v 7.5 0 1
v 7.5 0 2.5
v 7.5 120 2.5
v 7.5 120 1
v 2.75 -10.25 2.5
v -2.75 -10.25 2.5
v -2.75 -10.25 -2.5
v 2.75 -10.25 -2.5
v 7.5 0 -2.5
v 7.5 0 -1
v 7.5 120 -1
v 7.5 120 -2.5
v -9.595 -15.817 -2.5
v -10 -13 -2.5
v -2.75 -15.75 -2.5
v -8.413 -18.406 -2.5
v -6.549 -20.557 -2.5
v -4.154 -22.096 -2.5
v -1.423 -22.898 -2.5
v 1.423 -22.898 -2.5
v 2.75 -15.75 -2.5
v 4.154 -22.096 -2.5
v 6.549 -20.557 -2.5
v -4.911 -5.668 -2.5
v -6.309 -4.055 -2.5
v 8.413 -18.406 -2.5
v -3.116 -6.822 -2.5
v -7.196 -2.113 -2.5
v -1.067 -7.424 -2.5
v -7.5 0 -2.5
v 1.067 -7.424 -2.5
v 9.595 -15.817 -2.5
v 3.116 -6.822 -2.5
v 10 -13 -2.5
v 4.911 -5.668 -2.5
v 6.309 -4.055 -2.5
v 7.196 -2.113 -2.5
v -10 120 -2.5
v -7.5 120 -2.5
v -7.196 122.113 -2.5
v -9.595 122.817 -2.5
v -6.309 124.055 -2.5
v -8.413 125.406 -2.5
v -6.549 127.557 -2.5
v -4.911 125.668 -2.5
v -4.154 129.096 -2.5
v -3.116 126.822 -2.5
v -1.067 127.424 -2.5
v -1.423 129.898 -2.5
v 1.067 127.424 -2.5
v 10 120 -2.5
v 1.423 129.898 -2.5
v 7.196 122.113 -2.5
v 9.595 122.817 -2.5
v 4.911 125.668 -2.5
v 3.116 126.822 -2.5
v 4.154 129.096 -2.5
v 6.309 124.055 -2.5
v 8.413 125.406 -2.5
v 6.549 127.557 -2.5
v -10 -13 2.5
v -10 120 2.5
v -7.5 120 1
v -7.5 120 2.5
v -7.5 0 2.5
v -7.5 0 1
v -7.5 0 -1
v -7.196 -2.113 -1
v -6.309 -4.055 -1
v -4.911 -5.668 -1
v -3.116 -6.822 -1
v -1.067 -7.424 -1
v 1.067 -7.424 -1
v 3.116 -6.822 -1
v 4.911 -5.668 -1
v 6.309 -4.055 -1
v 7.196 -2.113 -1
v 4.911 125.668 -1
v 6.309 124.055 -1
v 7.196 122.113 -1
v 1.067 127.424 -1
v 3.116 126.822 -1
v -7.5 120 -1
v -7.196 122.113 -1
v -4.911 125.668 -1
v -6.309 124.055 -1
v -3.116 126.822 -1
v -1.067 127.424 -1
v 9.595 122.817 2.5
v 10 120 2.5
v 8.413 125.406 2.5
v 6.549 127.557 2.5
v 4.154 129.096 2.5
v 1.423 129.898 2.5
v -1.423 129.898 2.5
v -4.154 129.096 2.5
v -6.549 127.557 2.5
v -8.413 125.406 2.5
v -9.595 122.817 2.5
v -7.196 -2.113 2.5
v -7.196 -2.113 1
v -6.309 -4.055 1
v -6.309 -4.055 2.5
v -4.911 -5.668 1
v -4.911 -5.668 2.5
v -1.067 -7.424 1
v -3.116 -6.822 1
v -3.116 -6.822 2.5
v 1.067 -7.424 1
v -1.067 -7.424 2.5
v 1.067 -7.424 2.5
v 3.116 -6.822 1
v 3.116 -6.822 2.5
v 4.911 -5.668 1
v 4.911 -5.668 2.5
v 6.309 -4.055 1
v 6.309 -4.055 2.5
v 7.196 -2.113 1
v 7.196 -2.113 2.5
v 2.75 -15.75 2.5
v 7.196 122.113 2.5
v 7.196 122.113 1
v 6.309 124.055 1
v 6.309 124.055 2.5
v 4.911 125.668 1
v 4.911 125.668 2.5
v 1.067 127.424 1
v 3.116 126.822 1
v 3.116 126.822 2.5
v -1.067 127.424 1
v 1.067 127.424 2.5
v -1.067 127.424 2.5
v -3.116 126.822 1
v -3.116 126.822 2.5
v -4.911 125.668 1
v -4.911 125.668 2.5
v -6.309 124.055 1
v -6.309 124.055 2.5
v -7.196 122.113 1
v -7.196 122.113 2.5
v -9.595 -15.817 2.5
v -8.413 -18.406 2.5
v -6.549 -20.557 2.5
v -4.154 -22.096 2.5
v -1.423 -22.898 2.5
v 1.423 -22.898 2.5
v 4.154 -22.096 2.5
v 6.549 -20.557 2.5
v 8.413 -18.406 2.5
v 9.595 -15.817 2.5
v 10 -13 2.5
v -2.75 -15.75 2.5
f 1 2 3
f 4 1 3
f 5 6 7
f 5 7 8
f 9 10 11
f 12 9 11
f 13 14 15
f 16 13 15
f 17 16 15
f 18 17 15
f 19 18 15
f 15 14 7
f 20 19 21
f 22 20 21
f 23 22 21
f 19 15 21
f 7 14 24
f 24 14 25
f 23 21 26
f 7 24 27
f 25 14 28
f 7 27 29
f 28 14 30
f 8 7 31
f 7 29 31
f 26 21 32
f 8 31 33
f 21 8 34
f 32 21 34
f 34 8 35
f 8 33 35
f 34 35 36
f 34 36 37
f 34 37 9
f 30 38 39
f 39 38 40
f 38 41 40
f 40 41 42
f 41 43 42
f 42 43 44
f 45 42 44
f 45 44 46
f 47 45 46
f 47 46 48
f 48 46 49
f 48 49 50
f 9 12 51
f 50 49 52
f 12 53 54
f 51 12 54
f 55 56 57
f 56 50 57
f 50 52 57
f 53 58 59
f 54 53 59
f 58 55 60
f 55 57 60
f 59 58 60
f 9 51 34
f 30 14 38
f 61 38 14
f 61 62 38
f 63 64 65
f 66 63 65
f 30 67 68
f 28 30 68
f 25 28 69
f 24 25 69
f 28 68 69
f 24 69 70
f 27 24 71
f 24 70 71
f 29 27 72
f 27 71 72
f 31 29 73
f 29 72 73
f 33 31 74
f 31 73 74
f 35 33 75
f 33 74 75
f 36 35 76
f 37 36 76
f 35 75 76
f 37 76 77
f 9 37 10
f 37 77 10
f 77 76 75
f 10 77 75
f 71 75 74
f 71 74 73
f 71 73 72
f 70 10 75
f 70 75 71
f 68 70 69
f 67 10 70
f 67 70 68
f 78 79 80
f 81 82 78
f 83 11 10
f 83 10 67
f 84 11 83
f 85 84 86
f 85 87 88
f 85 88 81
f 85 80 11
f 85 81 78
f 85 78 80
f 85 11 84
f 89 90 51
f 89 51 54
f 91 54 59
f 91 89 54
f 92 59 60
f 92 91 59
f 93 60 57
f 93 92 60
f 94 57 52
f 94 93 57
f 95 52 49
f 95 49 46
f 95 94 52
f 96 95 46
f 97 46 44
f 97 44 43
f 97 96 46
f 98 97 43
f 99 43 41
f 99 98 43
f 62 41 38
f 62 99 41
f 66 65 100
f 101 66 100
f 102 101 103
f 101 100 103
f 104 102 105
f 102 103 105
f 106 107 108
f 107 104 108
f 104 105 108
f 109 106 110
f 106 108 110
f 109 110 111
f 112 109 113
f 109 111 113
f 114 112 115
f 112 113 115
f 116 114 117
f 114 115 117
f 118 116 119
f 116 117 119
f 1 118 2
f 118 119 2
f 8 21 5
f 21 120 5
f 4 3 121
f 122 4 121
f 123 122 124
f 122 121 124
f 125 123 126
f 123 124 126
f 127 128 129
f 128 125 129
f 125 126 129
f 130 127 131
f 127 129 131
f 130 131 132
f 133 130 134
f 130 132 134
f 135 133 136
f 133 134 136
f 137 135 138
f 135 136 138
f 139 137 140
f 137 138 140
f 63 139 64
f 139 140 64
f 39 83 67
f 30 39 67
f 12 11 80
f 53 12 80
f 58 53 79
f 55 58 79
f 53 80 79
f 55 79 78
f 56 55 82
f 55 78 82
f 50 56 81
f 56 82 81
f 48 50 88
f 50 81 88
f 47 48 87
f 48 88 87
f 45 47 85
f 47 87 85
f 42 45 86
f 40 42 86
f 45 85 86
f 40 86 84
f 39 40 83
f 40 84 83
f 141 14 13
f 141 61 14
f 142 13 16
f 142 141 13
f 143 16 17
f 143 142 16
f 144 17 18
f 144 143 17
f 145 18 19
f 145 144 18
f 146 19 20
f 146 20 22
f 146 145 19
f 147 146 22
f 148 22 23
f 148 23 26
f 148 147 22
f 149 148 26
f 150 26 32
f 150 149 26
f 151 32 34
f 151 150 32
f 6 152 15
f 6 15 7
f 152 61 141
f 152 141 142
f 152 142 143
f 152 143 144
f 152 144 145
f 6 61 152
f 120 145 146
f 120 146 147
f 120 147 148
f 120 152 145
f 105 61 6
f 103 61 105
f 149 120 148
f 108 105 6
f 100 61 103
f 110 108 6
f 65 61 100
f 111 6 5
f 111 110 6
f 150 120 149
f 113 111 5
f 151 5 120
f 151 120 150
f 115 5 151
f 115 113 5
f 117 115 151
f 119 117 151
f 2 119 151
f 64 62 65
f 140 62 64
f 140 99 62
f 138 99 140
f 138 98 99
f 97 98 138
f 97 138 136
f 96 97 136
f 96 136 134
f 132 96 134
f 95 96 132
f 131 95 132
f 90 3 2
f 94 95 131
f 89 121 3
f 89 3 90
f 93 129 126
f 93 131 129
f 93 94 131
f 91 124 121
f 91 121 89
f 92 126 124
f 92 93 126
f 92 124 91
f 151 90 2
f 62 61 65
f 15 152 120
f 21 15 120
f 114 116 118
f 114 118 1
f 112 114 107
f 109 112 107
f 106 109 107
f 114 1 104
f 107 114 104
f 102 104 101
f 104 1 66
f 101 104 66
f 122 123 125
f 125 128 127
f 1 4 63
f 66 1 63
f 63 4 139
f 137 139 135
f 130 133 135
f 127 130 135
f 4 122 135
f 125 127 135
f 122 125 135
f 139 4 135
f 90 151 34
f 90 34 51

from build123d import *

# Parameters (mm, degrees)
EXTRUDE_1_DEPTH = 1
SKETCH_2_W      = 5.5
SKETCH_2_H      = 5.5
EXTRUDE_2_DEPTH = 2.5


with BuildPart() as part:
    # 草图1 → 凸台-拉伸1 (new body, symmetric)
    with BuildSketch(Plane.XY):
        with BuildLine():
            Line((-7.5, 0), (-7.5, 120))
            ThreePointArc((-7.5, 120), (0, 127.5), (7.5, 120))
            Line((7.5, 120), (7.5, 0))
            ThreePointArc((7.5, 0), (0, -7.5), (-7.5, 0))
        make_face()
    extrude(amount=EXTRUDE_1_DEPTH, both=True)

    # 草图2 → 凸台-拉伸2 (add, symmetric)
    with BuildSketch(Plane.XY):
        with BuildLine():
            Line((-10, 0), (-10, -13))
            ThreePointArc((-10, -13), (0, -23), (10, -13))
            Line((10, -13), (10, 0))
            Line((10, 0), (10, 120))
            ThreePointArc((10, 120), (0, 130), (-10, 120))
            Line((-10, 120), (-10, 0))
        make_face()
        with Locations((0, -13)):
            Rectangle(SKETCH_2_W, SKETCH_2_H, mode=Mode.SUBTRACT)
        with BuildLine():
            Line((-7.5, 120), (-7.5, 0))
            ThreePointArc((-7.5, 0), (0, -7.5), (7.5, 0))
            Line((7.5, 0), (7.5, 120))
            ThreePointArc((7.5, 120), (0, 127.5), (-7.5, 120))
        make_face(mode=Mode.SUBTRACT)
    extrude(amount=EXTRUDE_2_DEPTH, both=True)


solid = part.part
